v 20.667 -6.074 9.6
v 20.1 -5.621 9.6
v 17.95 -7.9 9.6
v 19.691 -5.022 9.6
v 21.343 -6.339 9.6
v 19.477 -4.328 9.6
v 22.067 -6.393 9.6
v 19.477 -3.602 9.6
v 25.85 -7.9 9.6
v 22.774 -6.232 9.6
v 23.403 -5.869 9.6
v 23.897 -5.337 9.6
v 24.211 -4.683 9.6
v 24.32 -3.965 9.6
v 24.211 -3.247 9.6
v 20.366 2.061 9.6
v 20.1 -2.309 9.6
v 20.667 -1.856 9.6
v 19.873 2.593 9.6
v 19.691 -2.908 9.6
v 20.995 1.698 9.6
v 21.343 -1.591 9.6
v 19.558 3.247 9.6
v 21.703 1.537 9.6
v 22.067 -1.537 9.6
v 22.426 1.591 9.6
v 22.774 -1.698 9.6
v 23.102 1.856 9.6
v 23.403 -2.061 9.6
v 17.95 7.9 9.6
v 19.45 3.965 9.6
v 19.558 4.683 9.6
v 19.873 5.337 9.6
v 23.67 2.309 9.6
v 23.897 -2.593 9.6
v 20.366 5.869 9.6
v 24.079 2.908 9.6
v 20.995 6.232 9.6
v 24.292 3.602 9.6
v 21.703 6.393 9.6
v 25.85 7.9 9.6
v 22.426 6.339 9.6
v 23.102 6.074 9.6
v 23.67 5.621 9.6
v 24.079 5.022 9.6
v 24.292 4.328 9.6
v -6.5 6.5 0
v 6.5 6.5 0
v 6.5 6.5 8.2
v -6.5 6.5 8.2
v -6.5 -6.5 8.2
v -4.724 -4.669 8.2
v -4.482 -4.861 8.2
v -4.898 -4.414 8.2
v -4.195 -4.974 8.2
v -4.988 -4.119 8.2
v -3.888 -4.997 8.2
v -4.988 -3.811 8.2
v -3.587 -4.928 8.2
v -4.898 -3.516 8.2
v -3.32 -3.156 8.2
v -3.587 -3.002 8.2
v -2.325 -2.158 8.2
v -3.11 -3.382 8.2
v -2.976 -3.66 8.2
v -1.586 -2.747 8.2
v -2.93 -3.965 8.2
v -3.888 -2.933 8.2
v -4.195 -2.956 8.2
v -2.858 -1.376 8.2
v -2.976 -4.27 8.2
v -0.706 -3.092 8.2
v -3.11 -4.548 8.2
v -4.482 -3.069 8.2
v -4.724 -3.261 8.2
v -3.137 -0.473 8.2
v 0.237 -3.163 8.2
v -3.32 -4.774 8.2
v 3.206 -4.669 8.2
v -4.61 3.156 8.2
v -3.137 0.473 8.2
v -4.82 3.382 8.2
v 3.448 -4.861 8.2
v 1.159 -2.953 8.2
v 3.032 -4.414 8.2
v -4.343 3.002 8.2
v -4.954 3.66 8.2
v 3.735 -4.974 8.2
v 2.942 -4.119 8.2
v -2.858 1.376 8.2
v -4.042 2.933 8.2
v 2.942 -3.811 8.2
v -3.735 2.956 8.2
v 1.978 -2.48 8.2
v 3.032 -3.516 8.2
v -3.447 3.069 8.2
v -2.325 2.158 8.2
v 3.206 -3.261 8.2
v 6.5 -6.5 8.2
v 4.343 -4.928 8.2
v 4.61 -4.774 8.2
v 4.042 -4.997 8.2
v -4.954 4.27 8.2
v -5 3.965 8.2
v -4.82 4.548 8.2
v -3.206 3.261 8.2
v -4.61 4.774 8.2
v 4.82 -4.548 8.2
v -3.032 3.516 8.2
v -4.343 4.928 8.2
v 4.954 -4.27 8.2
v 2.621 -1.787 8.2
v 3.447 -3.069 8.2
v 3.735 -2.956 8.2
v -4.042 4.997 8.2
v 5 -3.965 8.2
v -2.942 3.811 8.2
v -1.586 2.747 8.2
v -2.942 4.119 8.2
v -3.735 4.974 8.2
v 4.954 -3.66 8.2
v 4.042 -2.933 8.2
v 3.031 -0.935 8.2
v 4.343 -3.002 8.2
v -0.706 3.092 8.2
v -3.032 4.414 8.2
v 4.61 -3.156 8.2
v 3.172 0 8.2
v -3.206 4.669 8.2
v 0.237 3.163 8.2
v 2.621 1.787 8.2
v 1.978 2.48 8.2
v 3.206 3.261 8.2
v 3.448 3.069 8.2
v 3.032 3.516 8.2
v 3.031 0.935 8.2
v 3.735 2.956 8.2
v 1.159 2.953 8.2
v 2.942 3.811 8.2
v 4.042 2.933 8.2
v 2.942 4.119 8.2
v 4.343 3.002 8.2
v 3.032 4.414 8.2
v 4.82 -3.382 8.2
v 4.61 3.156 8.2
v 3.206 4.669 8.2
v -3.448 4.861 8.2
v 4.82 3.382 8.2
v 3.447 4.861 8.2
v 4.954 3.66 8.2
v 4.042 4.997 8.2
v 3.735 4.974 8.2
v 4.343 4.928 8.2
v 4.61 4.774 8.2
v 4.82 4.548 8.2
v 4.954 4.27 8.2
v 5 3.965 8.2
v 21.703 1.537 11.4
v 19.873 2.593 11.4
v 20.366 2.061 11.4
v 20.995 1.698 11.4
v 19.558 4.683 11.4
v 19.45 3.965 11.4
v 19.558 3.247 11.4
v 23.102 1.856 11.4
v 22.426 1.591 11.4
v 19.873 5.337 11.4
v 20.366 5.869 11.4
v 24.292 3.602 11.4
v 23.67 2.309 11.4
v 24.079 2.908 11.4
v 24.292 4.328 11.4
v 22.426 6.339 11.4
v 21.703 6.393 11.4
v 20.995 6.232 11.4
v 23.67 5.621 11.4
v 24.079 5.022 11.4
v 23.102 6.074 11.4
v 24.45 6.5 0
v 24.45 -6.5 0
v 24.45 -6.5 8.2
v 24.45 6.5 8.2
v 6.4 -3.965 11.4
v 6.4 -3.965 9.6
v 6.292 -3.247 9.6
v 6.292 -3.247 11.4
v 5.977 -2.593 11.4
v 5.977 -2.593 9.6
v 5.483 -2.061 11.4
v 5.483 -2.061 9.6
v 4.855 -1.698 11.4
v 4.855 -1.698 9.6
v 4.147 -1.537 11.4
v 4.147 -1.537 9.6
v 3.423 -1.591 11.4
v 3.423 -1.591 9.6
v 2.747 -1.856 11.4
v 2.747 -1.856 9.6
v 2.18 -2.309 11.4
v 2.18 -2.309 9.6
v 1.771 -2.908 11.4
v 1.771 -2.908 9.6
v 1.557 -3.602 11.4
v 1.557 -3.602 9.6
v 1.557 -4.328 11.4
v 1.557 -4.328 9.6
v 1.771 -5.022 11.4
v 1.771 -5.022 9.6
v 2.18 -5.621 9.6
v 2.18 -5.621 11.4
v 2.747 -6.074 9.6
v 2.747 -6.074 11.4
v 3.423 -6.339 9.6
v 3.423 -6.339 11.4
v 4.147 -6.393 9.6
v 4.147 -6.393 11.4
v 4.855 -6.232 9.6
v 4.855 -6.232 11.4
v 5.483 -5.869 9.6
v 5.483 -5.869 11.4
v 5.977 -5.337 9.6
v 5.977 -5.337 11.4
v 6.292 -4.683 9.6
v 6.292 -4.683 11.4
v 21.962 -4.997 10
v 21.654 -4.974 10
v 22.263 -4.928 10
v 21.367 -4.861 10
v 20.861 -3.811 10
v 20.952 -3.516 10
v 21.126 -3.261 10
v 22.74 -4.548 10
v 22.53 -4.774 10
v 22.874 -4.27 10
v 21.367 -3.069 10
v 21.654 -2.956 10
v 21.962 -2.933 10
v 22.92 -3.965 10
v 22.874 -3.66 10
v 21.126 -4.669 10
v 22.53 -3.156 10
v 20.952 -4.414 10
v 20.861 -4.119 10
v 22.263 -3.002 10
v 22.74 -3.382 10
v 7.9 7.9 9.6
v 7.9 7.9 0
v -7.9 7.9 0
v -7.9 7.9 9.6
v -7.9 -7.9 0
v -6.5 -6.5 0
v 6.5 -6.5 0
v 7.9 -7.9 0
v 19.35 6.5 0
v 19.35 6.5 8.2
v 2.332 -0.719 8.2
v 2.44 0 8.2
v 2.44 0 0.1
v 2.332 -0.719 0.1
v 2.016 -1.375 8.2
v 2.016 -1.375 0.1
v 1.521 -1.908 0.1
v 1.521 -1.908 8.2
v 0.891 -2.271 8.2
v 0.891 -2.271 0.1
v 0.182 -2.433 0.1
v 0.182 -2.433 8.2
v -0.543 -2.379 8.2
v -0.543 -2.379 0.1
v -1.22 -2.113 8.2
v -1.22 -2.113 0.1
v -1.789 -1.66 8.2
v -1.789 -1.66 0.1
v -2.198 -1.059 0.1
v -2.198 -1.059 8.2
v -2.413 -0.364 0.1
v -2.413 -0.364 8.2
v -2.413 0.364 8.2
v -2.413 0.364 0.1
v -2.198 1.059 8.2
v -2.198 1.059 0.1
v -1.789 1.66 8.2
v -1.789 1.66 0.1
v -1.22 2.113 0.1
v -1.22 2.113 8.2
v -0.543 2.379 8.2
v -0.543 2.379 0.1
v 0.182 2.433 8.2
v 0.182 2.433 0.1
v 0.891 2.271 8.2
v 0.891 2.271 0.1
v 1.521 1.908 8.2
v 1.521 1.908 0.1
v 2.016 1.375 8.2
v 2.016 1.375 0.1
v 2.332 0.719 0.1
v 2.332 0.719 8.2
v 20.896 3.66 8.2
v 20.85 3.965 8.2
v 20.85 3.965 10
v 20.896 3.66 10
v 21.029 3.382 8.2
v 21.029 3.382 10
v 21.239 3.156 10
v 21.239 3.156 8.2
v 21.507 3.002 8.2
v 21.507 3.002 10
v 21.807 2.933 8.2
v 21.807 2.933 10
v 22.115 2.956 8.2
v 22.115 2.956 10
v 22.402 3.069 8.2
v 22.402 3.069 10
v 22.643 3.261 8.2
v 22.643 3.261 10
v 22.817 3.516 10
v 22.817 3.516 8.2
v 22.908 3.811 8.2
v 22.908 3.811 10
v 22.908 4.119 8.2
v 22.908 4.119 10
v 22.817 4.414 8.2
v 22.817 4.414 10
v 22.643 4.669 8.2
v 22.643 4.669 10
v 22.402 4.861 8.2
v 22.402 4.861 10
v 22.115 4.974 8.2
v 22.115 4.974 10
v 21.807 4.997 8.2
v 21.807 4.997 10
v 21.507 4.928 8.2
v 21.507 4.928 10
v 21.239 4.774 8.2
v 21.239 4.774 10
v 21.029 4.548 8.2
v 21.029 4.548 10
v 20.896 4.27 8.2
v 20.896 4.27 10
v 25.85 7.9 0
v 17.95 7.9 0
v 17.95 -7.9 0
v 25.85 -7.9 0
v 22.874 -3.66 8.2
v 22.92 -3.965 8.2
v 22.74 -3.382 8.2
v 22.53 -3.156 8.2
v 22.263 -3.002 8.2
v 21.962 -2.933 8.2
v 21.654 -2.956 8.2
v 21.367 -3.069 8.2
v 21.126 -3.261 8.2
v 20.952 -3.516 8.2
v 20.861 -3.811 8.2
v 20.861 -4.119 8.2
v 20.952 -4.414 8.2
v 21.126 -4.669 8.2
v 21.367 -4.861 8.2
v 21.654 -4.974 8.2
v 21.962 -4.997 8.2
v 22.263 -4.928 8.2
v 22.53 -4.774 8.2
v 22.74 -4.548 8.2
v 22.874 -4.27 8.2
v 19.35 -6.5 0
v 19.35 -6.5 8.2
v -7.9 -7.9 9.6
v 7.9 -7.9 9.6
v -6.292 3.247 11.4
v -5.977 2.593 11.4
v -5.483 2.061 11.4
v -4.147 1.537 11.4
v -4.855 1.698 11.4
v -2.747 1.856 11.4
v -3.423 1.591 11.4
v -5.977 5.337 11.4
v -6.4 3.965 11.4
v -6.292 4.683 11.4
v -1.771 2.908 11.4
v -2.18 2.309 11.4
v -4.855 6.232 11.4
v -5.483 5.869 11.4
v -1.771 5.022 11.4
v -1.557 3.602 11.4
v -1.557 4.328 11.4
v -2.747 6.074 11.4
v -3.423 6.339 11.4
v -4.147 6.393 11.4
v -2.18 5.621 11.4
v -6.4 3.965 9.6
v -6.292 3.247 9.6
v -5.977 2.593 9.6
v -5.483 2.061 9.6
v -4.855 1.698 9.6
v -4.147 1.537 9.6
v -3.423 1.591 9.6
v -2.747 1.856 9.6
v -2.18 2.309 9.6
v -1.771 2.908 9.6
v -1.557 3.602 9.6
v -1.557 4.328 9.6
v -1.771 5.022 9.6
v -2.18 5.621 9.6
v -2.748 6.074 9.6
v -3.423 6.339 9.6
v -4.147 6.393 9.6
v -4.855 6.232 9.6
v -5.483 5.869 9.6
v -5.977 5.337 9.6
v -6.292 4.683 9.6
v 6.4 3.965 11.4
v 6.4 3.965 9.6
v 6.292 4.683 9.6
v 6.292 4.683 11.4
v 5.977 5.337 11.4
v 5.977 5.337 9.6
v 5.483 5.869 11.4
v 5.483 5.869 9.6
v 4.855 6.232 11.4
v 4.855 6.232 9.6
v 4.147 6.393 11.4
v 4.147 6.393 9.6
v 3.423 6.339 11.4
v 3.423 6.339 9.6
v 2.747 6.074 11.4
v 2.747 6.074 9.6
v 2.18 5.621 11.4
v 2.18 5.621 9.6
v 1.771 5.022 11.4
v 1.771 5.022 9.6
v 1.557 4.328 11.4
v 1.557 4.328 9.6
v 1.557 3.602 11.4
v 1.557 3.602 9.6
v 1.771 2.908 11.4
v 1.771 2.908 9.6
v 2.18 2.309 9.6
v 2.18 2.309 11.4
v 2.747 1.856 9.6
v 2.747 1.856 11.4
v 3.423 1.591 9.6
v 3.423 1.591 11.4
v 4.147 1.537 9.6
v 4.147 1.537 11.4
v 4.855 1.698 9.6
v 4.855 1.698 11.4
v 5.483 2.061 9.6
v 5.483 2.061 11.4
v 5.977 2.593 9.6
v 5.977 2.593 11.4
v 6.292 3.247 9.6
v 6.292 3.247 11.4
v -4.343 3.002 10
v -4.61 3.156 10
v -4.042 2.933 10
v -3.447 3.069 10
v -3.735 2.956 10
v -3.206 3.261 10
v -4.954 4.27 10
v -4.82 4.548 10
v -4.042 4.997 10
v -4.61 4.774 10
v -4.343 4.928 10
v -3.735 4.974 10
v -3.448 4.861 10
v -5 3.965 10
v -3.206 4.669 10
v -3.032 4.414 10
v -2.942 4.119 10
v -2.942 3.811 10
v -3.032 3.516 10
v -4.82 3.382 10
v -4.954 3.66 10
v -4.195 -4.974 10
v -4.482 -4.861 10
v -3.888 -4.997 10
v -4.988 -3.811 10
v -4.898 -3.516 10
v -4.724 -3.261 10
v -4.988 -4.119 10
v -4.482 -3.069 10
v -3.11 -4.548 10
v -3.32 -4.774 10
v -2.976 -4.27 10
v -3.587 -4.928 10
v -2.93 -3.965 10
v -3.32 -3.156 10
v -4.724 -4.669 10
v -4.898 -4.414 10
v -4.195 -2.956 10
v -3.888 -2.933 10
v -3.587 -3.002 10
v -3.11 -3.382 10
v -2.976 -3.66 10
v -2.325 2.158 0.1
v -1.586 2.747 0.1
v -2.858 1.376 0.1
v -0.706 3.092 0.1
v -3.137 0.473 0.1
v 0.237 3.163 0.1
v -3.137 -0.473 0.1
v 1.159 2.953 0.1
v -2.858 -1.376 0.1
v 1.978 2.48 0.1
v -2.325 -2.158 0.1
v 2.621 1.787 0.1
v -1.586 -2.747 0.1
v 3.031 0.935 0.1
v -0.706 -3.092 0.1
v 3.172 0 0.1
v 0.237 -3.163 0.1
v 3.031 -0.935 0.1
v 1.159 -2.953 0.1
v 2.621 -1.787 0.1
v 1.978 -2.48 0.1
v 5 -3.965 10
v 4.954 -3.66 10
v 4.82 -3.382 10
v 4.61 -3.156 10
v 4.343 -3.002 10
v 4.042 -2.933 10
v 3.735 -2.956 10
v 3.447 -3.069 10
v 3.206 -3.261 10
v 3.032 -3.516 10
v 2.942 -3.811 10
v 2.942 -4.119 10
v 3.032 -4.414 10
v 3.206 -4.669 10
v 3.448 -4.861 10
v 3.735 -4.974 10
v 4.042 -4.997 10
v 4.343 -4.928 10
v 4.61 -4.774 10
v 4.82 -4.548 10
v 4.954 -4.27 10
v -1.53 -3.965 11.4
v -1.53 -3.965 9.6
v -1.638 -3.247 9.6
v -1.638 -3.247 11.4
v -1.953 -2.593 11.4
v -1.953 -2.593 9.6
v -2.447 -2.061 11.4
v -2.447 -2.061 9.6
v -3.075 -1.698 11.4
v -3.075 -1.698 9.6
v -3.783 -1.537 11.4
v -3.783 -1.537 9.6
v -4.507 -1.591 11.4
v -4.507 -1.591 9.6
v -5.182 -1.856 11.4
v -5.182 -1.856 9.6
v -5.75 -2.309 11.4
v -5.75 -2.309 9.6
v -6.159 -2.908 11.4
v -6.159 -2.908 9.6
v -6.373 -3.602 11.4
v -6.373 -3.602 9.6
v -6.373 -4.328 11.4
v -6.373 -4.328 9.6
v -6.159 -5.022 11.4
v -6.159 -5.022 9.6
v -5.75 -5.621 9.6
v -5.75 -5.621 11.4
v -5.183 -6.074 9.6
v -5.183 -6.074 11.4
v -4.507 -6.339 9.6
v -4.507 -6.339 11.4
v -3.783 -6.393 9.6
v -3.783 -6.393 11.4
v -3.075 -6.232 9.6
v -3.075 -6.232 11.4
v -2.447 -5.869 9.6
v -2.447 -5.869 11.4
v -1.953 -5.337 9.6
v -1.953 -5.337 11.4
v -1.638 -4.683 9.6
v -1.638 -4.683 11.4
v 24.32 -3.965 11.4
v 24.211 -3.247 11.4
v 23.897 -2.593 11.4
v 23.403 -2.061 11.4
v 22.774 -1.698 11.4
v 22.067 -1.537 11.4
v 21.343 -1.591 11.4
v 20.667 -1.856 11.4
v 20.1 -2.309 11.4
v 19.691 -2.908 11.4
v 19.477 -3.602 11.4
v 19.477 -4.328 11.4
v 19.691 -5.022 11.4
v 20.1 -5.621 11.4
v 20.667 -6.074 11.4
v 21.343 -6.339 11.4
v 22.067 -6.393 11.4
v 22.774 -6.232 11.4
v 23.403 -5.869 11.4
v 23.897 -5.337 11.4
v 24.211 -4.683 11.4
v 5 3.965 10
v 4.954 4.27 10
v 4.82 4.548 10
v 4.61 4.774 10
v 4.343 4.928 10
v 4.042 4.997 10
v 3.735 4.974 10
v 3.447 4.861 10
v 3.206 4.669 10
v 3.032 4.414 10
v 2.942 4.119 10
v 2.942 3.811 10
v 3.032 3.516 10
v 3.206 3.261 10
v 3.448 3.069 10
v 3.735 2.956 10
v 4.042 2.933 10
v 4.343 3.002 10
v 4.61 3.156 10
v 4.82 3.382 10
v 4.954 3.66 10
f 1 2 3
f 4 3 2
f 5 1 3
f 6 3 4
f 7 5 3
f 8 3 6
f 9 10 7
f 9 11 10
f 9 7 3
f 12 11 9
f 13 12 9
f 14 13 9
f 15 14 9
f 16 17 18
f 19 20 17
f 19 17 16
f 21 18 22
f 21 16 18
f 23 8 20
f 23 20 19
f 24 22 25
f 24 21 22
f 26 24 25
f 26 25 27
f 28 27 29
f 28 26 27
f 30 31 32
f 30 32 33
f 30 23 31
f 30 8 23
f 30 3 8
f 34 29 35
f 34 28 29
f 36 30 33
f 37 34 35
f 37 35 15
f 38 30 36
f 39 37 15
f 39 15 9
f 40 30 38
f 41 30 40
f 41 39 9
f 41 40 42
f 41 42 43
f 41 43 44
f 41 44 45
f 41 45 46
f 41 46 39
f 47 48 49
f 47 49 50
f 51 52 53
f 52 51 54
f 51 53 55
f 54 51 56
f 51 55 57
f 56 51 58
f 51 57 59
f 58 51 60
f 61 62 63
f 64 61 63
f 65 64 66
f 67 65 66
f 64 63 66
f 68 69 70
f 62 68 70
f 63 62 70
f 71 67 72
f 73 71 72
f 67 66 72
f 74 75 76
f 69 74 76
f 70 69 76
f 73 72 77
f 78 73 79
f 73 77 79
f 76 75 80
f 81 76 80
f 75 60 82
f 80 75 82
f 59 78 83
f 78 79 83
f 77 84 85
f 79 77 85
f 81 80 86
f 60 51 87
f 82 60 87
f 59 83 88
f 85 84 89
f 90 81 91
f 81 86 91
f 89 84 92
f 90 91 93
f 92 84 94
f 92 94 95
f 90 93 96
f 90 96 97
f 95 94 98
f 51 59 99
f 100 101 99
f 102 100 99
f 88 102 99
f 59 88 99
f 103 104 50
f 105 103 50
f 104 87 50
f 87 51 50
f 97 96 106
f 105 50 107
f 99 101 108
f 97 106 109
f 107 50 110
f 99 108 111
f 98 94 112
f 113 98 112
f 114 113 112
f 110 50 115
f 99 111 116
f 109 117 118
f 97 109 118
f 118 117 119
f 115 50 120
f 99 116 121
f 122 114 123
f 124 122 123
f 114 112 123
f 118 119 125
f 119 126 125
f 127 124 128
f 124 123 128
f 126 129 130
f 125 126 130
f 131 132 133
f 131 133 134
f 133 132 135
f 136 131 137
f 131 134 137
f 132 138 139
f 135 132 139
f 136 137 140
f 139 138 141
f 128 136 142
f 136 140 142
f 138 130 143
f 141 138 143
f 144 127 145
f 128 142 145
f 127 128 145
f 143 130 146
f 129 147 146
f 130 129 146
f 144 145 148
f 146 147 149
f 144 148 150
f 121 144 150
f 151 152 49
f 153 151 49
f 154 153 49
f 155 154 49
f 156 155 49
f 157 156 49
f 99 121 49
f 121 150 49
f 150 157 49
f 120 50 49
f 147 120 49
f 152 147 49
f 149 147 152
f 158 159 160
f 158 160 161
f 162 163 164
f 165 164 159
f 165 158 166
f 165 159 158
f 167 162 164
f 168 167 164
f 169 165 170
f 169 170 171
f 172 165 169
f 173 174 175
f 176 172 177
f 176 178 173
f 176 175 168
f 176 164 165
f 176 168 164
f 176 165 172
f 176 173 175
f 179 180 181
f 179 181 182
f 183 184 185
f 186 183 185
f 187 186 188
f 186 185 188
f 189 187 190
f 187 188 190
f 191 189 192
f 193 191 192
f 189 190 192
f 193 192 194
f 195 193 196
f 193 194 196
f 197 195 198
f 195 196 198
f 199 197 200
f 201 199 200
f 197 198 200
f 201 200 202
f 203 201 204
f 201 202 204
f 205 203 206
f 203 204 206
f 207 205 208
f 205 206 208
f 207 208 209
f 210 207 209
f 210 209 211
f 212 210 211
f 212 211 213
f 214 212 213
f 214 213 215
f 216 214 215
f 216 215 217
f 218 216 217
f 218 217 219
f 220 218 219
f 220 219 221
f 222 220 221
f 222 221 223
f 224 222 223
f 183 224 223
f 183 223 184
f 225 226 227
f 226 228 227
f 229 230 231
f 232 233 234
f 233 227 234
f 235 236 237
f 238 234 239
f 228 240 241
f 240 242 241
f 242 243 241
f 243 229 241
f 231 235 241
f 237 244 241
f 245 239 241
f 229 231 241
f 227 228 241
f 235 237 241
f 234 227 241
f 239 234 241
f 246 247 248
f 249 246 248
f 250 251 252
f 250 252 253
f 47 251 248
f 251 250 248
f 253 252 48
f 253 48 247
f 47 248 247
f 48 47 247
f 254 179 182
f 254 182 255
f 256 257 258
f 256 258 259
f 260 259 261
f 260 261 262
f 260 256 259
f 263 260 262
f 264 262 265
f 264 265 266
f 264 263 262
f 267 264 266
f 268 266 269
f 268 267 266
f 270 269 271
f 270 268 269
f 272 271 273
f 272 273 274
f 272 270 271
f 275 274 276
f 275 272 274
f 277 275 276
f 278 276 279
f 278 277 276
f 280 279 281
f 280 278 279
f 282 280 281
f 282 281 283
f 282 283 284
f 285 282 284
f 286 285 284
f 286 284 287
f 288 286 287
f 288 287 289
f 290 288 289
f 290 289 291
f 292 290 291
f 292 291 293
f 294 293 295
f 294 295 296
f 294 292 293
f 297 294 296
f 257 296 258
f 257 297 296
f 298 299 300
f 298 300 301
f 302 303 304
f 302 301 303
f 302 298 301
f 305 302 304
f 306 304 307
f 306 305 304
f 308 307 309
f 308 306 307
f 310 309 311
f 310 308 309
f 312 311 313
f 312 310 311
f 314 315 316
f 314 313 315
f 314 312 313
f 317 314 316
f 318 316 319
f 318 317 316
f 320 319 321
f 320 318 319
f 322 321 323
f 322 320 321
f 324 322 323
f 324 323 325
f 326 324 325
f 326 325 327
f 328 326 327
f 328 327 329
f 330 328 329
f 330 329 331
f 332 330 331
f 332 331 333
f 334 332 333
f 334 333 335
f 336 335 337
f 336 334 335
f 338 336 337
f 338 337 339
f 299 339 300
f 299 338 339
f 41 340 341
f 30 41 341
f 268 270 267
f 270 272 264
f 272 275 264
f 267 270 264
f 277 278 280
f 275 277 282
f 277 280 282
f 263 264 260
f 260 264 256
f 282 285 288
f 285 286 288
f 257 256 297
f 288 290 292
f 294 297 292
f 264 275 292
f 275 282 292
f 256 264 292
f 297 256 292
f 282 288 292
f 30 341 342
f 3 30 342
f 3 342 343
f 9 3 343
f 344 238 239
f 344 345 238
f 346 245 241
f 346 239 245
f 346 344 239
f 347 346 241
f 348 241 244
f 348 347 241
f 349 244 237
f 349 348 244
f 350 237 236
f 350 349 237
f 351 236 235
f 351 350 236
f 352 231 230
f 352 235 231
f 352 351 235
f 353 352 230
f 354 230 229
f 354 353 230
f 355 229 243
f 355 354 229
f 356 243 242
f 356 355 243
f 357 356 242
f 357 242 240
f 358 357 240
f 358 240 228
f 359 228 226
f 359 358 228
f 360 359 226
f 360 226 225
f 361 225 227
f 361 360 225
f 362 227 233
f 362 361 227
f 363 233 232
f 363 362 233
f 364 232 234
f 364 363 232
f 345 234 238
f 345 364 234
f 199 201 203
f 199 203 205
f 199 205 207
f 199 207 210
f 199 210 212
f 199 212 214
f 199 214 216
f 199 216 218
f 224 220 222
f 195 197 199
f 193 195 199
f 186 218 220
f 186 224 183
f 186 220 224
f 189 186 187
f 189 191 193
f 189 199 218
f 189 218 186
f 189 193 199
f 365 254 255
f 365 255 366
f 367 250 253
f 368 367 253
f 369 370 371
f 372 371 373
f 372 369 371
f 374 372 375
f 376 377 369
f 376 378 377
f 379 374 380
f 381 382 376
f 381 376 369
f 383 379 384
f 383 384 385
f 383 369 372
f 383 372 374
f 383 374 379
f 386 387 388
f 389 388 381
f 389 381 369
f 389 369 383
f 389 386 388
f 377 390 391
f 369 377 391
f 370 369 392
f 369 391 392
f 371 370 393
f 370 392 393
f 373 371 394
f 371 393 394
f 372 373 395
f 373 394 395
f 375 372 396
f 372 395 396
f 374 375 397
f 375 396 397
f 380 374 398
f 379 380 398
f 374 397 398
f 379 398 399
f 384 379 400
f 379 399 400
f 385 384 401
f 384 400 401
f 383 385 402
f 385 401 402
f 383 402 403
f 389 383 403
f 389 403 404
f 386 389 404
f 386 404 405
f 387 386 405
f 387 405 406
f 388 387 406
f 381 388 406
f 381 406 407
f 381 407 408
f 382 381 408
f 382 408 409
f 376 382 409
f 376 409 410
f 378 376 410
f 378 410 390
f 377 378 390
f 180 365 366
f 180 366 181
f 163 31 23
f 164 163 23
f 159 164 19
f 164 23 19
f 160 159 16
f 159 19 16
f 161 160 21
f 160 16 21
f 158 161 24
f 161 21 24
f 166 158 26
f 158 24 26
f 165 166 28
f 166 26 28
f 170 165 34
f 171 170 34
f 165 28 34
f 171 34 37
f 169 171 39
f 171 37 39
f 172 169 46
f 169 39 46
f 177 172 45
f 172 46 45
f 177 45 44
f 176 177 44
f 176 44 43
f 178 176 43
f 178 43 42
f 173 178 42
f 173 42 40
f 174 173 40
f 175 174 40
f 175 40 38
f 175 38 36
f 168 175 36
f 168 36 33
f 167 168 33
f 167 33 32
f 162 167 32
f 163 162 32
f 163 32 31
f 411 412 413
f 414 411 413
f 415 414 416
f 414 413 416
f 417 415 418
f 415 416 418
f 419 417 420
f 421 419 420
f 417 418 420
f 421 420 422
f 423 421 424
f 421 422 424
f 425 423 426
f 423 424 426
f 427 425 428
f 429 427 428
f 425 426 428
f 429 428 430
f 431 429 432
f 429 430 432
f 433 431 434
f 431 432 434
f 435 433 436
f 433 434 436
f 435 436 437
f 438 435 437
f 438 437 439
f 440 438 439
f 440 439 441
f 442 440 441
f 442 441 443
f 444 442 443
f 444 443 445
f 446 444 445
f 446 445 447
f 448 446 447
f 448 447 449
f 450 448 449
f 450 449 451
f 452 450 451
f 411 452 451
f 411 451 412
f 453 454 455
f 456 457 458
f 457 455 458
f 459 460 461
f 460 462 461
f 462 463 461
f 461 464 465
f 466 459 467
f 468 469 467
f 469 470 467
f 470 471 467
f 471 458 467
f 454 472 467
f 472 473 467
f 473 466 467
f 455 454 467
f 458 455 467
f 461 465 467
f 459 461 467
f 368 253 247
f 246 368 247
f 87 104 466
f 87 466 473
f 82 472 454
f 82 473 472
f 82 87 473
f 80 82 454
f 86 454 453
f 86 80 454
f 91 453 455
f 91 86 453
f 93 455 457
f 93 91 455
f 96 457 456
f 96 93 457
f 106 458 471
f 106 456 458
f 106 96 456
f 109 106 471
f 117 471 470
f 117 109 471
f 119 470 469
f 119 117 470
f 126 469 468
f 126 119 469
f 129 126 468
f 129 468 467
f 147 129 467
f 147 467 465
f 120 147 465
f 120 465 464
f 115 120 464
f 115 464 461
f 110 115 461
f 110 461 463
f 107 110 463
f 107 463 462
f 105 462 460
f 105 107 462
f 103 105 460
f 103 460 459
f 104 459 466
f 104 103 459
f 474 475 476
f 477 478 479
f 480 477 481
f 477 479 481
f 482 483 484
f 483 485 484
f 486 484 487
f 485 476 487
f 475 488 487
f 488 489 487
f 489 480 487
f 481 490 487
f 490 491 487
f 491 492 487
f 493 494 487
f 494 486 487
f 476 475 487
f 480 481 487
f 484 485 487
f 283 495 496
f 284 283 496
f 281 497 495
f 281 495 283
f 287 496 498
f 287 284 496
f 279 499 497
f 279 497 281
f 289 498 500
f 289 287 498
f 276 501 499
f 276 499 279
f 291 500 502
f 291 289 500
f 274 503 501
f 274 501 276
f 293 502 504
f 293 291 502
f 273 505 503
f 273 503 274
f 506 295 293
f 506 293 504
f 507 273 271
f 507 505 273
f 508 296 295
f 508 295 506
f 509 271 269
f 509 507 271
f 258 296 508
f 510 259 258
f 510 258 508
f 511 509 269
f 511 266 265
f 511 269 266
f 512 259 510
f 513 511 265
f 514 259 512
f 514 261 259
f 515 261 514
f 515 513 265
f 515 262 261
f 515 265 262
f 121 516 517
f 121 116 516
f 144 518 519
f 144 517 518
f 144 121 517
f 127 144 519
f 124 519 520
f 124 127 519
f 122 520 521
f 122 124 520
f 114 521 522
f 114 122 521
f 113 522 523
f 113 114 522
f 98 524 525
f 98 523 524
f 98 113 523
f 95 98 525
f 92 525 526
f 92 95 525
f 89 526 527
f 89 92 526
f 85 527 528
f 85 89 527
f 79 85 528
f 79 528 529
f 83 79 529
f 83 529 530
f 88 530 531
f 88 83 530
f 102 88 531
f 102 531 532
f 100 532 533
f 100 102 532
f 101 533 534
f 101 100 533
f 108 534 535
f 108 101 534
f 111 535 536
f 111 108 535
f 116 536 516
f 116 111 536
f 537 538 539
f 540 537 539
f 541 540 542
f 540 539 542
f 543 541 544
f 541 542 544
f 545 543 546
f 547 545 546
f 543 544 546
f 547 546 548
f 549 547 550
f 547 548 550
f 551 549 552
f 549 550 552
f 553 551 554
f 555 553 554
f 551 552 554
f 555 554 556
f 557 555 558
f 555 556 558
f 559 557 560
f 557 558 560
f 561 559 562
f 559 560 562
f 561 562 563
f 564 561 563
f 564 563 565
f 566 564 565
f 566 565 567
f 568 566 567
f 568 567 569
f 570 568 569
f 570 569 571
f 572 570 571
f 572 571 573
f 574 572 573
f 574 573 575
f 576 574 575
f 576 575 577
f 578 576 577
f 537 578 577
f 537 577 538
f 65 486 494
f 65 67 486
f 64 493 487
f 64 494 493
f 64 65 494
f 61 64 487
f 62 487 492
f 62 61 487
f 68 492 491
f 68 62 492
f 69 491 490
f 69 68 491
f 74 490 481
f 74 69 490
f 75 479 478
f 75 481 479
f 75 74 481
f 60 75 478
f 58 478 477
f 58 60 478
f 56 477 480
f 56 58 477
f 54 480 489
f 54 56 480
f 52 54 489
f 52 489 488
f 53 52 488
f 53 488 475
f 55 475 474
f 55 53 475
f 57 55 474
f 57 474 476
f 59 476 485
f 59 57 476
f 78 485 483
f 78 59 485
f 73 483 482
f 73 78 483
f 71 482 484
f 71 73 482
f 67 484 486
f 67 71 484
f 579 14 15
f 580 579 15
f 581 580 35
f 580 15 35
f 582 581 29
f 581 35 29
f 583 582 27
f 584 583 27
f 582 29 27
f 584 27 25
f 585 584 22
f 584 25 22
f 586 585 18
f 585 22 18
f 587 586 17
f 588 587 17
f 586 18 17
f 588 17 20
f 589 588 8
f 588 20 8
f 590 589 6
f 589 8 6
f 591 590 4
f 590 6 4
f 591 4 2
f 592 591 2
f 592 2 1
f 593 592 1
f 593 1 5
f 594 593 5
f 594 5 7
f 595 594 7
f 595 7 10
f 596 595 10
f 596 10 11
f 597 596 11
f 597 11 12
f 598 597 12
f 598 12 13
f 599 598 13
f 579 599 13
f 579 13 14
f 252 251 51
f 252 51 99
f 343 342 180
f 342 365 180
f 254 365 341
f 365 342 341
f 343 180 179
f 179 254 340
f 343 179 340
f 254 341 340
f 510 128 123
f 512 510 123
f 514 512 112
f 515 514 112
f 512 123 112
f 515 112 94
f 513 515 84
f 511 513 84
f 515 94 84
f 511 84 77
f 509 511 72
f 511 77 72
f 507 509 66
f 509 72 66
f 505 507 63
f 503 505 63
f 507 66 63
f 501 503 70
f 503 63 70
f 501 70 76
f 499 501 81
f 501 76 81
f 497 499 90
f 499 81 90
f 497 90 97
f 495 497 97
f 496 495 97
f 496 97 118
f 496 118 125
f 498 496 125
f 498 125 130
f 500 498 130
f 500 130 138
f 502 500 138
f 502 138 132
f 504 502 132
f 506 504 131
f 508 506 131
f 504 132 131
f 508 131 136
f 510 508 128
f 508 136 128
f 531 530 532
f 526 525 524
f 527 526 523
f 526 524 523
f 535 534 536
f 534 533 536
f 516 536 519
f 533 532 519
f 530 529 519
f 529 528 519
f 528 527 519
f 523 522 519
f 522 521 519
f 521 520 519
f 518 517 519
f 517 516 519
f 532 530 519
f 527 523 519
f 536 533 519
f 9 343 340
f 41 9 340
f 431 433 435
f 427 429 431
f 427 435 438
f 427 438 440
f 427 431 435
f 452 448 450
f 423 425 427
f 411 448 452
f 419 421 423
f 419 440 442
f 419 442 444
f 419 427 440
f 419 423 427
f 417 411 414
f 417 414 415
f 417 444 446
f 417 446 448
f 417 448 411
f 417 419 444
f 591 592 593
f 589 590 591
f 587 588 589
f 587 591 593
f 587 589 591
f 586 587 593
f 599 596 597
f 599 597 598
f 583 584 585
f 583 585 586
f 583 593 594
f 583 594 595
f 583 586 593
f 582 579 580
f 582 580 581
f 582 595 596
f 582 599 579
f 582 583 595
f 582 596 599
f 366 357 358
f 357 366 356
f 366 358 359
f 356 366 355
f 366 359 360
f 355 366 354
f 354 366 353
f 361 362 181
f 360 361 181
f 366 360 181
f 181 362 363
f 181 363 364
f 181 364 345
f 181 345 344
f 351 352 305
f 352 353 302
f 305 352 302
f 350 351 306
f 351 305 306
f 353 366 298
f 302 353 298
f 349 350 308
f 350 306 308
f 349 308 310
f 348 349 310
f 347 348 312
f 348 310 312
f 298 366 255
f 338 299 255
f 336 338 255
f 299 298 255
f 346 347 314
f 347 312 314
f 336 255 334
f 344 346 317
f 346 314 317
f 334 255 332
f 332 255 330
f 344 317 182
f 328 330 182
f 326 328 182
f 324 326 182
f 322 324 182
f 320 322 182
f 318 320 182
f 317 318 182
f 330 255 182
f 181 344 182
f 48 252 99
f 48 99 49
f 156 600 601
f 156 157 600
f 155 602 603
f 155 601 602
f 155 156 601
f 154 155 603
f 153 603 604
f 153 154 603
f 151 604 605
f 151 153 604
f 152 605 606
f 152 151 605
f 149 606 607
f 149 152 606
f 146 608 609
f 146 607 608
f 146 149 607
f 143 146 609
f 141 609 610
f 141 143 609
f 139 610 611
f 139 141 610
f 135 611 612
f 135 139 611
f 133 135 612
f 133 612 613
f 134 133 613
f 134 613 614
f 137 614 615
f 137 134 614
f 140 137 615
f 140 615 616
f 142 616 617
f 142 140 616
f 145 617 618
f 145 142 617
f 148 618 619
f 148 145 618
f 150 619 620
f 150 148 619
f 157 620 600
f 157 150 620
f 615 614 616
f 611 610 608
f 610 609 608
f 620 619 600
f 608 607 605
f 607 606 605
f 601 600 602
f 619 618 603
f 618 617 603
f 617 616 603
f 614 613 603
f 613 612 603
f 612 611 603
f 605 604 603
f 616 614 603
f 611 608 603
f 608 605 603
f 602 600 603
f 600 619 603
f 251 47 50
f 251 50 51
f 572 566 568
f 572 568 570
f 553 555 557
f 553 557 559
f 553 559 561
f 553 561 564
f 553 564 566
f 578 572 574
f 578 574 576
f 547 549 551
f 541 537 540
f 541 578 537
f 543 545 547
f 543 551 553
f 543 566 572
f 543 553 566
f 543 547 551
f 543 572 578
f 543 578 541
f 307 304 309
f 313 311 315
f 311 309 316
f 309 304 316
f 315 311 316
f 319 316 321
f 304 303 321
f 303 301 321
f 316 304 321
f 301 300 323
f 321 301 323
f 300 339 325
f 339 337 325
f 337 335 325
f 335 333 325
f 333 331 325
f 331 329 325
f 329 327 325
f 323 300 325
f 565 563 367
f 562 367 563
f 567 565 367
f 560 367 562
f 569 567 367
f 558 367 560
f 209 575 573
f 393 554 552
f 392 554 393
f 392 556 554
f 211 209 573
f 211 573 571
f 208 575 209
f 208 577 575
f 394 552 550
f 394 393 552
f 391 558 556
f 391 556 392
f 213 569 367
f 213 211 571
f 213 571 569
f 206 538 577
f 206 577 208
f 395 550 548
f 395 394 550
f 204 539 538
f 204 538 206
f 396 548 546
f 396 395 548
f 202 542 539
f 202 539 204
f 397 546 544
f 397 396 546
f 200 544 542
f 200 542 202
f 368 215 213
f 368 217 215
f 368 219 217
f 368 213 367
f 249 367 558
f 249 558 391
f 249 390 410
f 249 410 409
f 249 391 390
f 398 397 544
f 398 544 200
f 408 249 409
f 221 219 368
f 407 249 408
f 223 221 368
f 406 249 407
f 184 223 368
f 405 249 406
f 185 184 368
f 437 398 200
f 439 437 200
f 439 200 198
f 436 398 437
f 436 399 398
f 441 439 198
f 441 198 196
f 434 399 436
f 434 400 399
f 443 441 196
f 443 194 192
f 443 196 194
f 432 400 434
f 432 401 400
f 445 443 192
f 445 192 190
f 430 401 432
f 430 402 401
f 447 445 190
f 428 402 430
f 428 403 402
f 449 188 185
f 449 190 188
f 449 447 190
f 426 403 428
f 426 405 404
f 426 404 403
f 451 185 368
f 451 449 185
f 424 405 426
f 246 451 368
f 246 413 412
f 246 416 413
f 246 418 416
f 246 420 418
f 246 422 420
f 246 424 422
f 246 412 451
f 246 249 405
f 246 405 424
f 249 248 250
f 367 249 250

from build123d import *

# Parameters (mm, degrees)
F0_R     = 2.435
F1_DEPTH = 9.6
F2_DEPTH = 11.4
F3_DEPTH = 9.6
F4_DEPTH = 11.4
F5_T     = -1.4
F5_2_T   = -1.4
F6_R     = 3.172
F6_R_2   = 2.44
F7_DEPTH = 8.1


with BuildPart() as f1:
    # F0 (on Top) → F1 (new body)
    with BuildSketch(Plane.XY):
        Polygon((7.9, -7.9), (7.9, 7.9), (0, 7.9), (-7.9, 7.9), (-7.9, 3.965), (-7.9, -7.9), align=None)
        with Locations((-3.965, -3.965)):
            Circle(F0_R, mode=Mode.SUBTRACT)
        with Locations((3.965, -3.965)):
            Circle(F0_R, mode=Mode.SUBTRACT)
        with BuildLine():
            ThreePointArc((-1.53, 3.965), (-3.965, 1.53), (-6.4, 3.965))
            ThreePointArc((-6.4, 3.965), (-3.965, 6.4), (-1.53, 3.965))
        make_face(mode=Mode.SUBTRACT)
        with Locations((3.965, 3.965)):
            Circle(F0_R, mode=Mode.SUBTRACT)
    extrude(amount=F1_DEPTH)

    # F0 (on Top) → F2 (join)
    with BuildSketch(Plane.XY):
        with BuildLine():
            ThreePointArc((-1.53, 3.965), (-3.965, 6.4), (-6.4, 3.965))
            ThreePointArc((-6.4, 3.965), (-3.965, 1.53), (-1.53, 3.965))
        make_face()
        with Locations((3.965, 3.965)):
            Circle(F0_R)
        with Locations((-3.965, -3.965)):
            Circle(F0_R)
        with Locations((3.965, -3.965)):
            Circle(F0_R)
    extrude(amount=F2_DEPTH)

    # F5
    f5_openings = [f1.faces().sort_by_distance(p)[0] for p in [
        (0, 0, 0),
    ]]
    offset(amount=F5_T, openings=f5_openings, kind=Kind.INTERSECTION)

    # F6 (on face) → F7 (join)
    with BuildSketch(Plane(origin=(0, 0, 8.2), x_dir=(1, 0, 0), z_dir=(0, 0, -1))):
        Circle(F6_R)
        Circle(F6_R_2, mode=Mode.SUBTRACT)
    extrude(amount=F7_DEPTH)


with BuildPart() as f3:
    # F0 (on Top) → F3 (new body)
    with BuildSketch(Plane.XY):
        Polygon((17.9496426135, 3.965), (17.9496426135, -7.9), (25.8496426135, -7.9), (25.8496426135, 7.9), (17.9496426135, 7.9), align=None)
        with Locations((21.8846426135, -3.965)):
            Circle(F0_R, mode=Mode.SUBTRACT)
        with BuildLine():
            ThreePointArc((24.3196426135, 3.965), (21.8846426135, 1.53), (19.4496426135, 3.965))
            ThreePointArc((19.4496426135, 3.965), (21.8846426135, 6.4), (24.3196426135, 3.965))
        make_face(mode=Mode.SUBTRACT)
    extrude(amount=F3_DEPTH)

    # F0 (on Top) → F4 (join)
    with BuildSketch(Plane.XY):
        with BuildLine():
            ThreePointArc((24.3196426135, 3.965), (21.8846426135, 6.4), (19.4496426135, 3.965))
            ThreePointArc((19.4496426135, 3.965), (21.8846426135, 1.53), (24.3196426135, 3.965))
        make_face()
        with Locations((21.8846426135, -3.965)):
            Circle(F0_R)
    extrude(amount=F4_DEPTH)

    # F5#2
    f5_2_openings = [f3.faces().sort_by_distance(p)[0] for p in [
        (21.899643, 0, 0),
    ]]
    offset(amount=F5_2_T, openings=f5_2_openings, kind=Kind.INTERSECTION)


solid = Compound([f1.part, f3.part])
